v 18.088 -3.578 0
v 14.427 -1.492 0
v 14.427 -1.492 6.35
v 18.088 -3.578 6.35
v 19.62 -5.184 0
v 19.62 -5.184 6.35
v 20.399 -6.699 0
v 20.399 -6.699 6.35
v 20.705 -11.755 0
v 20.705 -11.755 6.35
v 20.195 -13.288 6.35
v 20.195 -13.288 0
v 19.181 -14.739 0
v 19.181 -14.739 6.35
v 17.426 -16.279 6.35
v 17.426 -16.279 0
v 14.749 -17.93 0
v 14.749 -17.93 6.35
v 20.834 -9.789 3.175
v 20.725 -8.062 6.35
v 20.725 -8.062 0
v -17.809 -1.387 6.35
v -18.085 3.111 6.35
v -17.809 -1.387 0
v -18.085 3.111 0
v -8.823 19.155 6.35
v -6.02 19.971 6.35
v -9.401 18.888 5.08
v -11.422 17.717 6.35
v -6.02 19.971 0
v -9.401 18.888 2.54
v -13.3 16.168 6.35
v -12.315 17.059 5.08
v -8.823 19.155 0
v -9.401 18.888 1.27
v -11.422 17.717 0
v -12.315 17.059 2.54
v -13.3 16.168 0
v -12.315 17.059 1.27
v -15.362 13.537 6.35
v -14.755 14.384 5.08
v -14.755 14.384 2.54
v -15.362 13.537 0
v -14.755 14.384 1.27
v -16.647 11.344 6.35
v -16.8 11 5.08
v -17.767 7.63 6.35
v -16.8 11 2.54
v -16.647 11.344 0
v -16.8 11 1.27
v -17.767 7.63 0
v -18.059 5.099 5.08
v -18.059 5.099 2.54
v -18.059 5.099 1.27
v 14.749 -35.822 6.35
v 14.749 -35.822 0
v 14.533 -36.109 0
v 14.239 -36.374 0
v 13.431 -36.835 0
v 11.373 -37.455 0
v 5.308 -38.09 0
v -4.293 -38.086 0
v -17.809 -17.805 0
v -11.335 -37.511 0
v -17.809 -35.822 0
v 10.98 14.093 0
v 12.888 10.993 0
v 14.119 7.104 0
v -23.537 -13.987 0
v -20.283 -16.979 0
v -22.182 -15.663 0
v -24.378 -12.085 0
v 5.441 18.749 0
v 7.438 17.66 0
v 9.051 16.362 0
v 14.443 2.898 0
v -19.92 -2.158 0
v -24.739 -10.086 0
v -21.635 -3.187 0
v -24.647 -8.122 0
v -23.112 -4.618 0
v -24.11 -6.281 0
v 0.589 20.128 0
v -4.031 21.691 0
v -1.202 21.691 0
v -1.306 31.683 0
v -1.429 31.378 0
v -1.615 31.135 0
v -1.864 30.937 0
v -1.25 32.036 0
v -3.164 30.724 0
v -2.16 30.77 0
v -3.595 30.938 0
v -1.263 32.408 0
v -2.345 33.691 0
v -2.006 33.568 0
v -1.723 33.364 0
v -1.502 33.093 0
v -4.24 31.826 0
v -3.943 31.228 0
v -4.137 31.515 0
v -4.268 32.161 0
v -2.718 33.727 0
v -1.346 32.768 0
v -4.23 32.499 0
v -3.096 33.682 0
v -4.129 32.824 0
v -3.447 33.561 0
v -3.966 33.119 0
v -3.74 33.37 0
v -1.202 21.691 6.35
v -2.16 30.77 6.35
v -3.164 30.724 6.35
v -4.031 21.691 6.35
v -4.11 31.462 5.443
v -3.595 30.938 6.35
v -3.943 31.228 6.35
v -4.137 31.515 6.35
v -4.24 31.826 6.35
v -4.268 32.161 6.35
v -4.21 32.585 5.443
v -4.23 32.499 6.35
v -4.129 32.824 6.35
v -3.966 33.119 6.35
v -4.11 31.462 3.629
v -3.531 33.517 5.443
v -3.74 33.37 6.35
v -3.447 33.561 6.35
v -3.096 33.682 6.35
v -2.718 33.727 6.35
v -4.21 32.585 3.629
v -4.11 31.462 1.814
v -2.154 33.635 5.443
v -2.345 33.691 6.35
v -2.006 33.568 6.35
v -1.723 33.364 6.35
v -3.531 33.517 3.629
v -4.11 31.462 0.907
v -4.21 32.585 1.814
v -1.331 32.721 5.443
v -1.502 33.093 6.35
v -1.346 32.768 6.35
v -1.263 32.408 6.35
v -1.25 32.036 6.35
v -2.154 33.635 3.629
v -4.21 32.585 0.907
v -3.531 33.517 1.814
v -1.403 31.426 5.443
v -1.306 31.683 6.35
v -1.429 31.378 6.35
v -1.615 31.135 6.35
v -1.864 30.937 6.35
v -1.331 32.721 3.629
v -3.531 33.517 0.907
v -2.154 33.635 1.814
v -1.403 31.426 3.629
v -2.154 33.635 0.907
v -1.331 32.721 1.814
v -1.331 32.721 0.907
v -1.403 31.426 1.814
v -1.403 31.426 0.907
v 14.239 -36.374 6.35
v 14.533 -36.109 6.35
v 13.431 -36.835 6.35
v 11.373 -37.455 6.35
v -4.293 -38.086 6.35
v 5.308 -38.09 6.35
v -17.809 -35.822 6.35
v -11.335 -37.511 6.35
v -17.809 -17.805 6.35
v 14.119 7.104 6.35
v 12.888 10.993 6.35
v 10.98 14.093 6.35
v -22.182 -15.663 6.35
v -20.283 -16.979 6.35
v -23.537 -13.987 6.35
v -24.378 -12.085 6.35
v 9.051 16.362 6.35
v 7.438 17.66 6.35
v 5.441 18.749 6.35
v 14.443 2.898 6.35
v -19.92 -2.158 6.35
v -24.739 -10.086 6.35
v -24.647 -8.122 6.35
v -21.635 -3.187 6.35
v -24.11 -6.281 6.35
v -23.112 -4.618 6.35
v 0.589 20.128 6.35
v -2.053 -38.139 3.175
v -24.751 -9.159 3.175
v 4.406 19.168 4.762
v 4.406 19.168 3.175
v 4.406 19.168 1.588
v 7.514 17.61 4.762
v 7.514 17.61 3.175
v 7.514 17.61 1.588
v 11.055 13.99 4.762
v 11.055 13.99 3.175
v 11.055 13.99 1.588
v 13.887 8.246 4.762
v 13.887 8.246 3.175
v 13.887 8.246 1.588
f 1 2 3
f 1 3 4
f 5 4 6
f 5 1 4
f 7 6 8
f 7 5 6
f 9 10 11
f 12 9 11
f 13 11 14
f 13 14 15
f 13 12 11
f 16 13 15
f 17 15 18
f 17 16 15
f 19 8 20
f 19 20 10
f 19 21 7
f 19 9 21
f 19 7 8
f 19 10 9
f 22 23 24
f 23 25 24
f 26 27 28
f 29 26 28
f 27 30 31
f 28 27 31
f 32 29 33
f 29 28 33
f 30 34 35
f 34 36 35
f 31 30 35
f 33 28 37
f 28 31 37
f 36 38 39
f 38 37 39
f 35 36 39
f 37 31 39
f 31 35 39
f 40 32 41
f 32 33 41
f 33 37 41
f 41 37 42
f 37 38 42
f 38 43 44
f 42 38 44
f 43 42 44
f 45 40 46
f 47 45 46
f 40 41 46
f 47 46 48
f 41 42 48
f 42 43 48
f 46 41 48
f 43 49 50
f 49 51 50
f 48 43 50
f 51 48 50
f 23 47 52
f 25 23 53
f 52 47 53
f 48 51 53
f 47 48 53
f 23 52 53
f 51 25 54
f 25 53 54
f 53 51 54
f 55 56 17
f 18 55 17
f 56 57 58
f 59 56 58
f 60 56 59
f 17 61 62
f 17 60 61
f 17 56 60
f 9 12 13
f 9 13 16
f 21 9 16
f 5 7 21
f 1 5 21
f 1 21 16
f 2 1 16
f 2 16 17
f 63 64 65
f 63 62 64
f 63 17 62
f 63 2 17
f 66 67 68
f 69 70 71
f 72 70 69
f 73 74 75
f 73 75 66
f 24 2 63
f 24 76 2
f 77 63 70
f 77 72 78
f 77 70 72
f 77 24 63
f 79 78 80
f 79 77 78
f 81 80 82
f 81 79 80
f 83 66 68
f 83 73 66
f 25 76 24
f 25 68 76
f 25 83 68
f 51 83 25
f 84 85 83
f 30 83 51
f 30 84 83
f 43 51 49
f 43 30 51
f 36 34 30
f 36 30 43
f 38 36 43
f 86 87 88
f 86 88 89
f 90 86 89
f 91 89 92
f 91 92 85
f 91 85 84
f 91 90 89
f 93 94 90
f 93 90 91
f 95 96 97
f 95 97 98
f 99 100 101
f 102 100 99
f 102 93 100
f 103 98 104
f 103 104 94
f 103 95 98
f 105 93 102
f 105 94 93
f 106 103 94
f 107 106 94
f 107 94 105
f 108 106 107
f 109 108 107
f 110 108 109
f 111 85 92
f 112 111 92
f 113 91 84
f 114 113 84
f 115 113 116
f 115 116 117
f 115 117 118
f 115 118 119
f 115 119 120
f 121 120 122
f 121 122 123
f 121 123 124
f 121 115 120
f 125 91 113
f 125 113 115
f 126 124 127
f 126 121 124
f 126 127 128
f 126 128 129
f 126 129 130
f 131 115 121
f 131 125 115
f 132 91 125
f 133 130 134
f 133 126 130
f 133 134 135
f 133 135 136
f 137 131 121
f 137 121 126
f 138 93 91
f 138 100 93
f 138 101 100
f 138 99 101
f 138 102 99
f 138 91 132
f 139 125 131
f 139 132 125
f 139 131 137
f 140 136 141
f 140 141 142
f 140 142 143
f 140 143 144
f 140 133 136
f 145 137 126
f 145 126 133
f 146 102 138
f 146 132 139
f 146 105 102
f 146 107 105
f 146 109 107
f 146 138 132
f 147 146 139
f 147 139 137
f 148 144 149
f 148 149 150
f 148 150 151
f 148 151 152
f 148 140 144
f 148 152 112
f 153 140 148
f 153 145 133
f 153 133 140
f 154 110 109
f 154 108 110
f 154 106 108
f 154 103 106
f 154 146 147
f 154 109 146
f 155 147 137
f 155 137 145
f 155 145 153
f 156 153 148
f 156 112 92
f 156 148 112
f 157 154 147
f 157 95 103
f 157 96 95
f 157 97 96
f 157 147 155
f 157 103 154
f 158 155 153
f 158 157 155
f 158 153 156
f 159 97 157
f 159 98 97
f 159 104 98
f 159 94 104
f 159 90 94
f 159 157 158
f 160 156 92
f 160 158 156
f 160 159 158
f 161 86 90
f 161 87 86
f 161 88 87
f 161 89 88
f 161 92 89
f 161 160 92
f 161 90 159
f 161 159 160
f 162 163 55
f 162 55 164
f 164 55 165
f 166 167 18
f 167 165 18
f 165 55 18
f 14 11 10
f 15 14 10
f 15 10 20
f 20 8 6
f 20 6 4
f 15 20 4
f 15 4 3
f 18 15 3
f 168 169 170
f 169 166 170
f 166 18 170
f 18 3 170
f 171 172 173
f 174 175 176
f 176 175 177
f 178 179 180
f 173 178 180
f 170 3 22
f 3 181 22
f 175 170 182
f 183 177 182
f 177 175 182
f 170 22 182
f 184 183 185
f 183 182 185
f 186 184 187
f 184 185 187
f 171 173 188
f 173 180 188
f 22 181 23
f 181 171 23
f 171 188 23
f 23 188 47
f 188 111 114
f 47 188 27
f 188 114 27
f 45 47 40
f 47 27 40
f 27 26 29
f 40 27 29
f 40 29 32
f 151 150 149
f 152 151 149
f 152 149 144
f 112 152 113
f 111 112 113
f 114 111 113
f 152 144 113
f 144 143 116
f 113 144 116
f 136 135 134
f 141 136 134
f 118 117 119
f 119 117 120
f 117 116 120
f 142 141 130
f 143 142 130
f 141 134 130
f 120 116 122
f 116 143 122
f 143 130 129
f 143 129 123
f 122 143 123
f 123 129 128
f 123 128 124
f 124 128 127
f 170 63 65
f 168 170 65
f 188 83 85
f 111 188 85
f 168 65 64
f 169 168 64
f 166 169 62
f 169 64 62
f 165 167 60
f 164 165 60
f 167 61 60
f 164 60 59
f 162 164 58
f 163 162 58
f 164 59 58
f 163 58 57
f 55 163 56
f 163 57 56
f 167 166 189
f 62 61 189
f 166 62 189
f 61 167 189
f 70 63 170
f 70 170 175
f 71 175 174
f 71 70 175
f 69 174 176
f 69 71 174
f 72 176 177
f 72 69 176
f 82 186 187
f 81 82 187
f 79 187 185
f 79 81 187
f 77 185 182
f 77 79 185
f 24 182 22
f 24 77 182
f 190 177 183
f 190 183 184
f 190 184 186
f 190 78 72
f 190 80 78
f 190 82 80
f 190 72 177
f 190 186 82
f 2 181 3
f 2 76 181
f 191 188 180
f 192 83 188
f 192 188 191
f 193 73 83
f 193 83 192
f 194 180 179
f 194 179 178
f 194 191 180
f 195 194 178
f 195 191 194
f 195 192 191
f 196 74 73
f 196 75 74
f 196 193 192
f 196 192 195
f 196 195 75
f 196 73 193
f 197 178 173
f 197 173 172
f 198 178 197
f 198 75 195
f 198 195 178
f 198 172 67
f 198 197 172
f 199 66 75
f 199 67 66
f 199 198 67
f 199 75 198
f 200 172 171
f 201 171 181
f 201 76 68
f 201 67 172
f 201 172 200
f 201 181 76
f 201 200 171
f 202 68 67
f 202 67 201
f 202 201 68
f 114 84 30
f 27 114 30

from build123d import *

# Parameters (mm, degrees)
F1_DEPTH = 6.35


with BuildPart() as f1:
    # F0 (on Top) → F1 (new body)
    with BuildSketch(Plane.XY):
        with BuildLine():
            add(Edge.make_bspline(
                [(-17.8087707609, -17.8047697991), (-22.8601377457, -16.8267022818), (-26.8589472699, -8.8010269979), (-22.4400032312, -2.6471242309), (-17.8087707609, -1.3867180096)],
                knots=[0, 0, 0, 0, 0.5077474502, 1, 1, 1, 1], degree=3))
            Line((-17.8087707609, -17.8047697991), (-17.8087707609, -30.0455205142))
            Line((-17.8087707609, -30.0455205142), (-17.8087707609, -35.8215384185))
            add(Edge.make_bspline(
                [(-17.8087707609, -35.8215384185), (-12.7404900268, -37.6972183585), (-4.0272323551, -38.3667112626), (13.4030133486, -38.1388328969), (14.7486086935, -35.8215384185)],
                knots=[0, 0, 0, 0, 0.4921202108, 1, 1, 1, 1], degree=3))
            Line((14.7486086935, -35.8215384185), (14.7486086935, -17.9304257035))
            add(Edge.make_bspline(
                [(14.4269019365, -1.4917515218), (20.4138346016, -4.0125651285), (21.2008225366, -10.0734105243), (20.518867299, -14.831058681), (14.7486086935, -17.9304257035)],
                knots=[0, 0, 0, 0, 0.503867428, 1, 1, 1, 1], degree=3))
            add(Edge.make_bspline(
                [(0.5892824847, 20.1278757304), (3.3169696364, 19.7187227484), (7.7328274813, 18.0679030674), (11.2077832285, 14.0420057336), (14.6994140615, 8.286586887), (14.4496048824, 1.8159416174), (14.4269019365, -1.4917515218)],
                knots=[0, 0, 0, 0, 0.255634179, 0.4675532575, 0.7058895566, 1, 1, 1, 1], degree=3))
            Line((0.5892824847, 20.1278757304), (-1.20218948, 21.6906256974))
            Line((-1.20218948, 21.6906256974), (-2.1603249479, 30.7700987905))
            add(Edge.make_bspline(
                [(-3.1640857924, 30.7244732976), (-3.571670647, 30.8806690809), (-4.2685921168, 31.3602531845), (-4.3280254073, 32.6269141204), (-3.6471676987, 33.6906279149), (-2.0566066117, 33.8467765544), (-1.1661180238, 32.7886800072), (-1.2520737733, 31.3261280299), (-1.8288642951, 30.9342307701), (-2.1603249479, 30.7700987905)],
                knots=[0, 0, 0, 0, 0.1430719695, 0.2817530389, 0.4220544222, 0.5755756794, 0.7205004163, 0.8692523372, 1, 1, 1, 1], degree=3))
            Line((-3.1640857924, 30.7244732976), (-4.0309703909, 21.6906256974))
            Line((-4.0309703909, 21.6906256974), (-6.0203862377, 19.9705008417))
            add(Edge.make_bspline(
                [(-6.0203862377, 19.9705008417), (-8.21159944, 19.7075563571), (-12.578458802, 17.3131629037), (-14.7342046184, 14.4311538518), (-17.1637251565, 11.0457164764), (-18.392473973, 4.9966715006), (-17.9561832673, 0.7642328675), (-17.8087707609, -1.3867180096)],
                knots=[0, 0, 0, 0, 0.2284315339, 0.3934737495, 0.5659503247, 0.7790229102, 1, 1, 1, 1], degree=3))
        make_face()
    extrude(amount=F1_DEPTH)


solid = f1.part
